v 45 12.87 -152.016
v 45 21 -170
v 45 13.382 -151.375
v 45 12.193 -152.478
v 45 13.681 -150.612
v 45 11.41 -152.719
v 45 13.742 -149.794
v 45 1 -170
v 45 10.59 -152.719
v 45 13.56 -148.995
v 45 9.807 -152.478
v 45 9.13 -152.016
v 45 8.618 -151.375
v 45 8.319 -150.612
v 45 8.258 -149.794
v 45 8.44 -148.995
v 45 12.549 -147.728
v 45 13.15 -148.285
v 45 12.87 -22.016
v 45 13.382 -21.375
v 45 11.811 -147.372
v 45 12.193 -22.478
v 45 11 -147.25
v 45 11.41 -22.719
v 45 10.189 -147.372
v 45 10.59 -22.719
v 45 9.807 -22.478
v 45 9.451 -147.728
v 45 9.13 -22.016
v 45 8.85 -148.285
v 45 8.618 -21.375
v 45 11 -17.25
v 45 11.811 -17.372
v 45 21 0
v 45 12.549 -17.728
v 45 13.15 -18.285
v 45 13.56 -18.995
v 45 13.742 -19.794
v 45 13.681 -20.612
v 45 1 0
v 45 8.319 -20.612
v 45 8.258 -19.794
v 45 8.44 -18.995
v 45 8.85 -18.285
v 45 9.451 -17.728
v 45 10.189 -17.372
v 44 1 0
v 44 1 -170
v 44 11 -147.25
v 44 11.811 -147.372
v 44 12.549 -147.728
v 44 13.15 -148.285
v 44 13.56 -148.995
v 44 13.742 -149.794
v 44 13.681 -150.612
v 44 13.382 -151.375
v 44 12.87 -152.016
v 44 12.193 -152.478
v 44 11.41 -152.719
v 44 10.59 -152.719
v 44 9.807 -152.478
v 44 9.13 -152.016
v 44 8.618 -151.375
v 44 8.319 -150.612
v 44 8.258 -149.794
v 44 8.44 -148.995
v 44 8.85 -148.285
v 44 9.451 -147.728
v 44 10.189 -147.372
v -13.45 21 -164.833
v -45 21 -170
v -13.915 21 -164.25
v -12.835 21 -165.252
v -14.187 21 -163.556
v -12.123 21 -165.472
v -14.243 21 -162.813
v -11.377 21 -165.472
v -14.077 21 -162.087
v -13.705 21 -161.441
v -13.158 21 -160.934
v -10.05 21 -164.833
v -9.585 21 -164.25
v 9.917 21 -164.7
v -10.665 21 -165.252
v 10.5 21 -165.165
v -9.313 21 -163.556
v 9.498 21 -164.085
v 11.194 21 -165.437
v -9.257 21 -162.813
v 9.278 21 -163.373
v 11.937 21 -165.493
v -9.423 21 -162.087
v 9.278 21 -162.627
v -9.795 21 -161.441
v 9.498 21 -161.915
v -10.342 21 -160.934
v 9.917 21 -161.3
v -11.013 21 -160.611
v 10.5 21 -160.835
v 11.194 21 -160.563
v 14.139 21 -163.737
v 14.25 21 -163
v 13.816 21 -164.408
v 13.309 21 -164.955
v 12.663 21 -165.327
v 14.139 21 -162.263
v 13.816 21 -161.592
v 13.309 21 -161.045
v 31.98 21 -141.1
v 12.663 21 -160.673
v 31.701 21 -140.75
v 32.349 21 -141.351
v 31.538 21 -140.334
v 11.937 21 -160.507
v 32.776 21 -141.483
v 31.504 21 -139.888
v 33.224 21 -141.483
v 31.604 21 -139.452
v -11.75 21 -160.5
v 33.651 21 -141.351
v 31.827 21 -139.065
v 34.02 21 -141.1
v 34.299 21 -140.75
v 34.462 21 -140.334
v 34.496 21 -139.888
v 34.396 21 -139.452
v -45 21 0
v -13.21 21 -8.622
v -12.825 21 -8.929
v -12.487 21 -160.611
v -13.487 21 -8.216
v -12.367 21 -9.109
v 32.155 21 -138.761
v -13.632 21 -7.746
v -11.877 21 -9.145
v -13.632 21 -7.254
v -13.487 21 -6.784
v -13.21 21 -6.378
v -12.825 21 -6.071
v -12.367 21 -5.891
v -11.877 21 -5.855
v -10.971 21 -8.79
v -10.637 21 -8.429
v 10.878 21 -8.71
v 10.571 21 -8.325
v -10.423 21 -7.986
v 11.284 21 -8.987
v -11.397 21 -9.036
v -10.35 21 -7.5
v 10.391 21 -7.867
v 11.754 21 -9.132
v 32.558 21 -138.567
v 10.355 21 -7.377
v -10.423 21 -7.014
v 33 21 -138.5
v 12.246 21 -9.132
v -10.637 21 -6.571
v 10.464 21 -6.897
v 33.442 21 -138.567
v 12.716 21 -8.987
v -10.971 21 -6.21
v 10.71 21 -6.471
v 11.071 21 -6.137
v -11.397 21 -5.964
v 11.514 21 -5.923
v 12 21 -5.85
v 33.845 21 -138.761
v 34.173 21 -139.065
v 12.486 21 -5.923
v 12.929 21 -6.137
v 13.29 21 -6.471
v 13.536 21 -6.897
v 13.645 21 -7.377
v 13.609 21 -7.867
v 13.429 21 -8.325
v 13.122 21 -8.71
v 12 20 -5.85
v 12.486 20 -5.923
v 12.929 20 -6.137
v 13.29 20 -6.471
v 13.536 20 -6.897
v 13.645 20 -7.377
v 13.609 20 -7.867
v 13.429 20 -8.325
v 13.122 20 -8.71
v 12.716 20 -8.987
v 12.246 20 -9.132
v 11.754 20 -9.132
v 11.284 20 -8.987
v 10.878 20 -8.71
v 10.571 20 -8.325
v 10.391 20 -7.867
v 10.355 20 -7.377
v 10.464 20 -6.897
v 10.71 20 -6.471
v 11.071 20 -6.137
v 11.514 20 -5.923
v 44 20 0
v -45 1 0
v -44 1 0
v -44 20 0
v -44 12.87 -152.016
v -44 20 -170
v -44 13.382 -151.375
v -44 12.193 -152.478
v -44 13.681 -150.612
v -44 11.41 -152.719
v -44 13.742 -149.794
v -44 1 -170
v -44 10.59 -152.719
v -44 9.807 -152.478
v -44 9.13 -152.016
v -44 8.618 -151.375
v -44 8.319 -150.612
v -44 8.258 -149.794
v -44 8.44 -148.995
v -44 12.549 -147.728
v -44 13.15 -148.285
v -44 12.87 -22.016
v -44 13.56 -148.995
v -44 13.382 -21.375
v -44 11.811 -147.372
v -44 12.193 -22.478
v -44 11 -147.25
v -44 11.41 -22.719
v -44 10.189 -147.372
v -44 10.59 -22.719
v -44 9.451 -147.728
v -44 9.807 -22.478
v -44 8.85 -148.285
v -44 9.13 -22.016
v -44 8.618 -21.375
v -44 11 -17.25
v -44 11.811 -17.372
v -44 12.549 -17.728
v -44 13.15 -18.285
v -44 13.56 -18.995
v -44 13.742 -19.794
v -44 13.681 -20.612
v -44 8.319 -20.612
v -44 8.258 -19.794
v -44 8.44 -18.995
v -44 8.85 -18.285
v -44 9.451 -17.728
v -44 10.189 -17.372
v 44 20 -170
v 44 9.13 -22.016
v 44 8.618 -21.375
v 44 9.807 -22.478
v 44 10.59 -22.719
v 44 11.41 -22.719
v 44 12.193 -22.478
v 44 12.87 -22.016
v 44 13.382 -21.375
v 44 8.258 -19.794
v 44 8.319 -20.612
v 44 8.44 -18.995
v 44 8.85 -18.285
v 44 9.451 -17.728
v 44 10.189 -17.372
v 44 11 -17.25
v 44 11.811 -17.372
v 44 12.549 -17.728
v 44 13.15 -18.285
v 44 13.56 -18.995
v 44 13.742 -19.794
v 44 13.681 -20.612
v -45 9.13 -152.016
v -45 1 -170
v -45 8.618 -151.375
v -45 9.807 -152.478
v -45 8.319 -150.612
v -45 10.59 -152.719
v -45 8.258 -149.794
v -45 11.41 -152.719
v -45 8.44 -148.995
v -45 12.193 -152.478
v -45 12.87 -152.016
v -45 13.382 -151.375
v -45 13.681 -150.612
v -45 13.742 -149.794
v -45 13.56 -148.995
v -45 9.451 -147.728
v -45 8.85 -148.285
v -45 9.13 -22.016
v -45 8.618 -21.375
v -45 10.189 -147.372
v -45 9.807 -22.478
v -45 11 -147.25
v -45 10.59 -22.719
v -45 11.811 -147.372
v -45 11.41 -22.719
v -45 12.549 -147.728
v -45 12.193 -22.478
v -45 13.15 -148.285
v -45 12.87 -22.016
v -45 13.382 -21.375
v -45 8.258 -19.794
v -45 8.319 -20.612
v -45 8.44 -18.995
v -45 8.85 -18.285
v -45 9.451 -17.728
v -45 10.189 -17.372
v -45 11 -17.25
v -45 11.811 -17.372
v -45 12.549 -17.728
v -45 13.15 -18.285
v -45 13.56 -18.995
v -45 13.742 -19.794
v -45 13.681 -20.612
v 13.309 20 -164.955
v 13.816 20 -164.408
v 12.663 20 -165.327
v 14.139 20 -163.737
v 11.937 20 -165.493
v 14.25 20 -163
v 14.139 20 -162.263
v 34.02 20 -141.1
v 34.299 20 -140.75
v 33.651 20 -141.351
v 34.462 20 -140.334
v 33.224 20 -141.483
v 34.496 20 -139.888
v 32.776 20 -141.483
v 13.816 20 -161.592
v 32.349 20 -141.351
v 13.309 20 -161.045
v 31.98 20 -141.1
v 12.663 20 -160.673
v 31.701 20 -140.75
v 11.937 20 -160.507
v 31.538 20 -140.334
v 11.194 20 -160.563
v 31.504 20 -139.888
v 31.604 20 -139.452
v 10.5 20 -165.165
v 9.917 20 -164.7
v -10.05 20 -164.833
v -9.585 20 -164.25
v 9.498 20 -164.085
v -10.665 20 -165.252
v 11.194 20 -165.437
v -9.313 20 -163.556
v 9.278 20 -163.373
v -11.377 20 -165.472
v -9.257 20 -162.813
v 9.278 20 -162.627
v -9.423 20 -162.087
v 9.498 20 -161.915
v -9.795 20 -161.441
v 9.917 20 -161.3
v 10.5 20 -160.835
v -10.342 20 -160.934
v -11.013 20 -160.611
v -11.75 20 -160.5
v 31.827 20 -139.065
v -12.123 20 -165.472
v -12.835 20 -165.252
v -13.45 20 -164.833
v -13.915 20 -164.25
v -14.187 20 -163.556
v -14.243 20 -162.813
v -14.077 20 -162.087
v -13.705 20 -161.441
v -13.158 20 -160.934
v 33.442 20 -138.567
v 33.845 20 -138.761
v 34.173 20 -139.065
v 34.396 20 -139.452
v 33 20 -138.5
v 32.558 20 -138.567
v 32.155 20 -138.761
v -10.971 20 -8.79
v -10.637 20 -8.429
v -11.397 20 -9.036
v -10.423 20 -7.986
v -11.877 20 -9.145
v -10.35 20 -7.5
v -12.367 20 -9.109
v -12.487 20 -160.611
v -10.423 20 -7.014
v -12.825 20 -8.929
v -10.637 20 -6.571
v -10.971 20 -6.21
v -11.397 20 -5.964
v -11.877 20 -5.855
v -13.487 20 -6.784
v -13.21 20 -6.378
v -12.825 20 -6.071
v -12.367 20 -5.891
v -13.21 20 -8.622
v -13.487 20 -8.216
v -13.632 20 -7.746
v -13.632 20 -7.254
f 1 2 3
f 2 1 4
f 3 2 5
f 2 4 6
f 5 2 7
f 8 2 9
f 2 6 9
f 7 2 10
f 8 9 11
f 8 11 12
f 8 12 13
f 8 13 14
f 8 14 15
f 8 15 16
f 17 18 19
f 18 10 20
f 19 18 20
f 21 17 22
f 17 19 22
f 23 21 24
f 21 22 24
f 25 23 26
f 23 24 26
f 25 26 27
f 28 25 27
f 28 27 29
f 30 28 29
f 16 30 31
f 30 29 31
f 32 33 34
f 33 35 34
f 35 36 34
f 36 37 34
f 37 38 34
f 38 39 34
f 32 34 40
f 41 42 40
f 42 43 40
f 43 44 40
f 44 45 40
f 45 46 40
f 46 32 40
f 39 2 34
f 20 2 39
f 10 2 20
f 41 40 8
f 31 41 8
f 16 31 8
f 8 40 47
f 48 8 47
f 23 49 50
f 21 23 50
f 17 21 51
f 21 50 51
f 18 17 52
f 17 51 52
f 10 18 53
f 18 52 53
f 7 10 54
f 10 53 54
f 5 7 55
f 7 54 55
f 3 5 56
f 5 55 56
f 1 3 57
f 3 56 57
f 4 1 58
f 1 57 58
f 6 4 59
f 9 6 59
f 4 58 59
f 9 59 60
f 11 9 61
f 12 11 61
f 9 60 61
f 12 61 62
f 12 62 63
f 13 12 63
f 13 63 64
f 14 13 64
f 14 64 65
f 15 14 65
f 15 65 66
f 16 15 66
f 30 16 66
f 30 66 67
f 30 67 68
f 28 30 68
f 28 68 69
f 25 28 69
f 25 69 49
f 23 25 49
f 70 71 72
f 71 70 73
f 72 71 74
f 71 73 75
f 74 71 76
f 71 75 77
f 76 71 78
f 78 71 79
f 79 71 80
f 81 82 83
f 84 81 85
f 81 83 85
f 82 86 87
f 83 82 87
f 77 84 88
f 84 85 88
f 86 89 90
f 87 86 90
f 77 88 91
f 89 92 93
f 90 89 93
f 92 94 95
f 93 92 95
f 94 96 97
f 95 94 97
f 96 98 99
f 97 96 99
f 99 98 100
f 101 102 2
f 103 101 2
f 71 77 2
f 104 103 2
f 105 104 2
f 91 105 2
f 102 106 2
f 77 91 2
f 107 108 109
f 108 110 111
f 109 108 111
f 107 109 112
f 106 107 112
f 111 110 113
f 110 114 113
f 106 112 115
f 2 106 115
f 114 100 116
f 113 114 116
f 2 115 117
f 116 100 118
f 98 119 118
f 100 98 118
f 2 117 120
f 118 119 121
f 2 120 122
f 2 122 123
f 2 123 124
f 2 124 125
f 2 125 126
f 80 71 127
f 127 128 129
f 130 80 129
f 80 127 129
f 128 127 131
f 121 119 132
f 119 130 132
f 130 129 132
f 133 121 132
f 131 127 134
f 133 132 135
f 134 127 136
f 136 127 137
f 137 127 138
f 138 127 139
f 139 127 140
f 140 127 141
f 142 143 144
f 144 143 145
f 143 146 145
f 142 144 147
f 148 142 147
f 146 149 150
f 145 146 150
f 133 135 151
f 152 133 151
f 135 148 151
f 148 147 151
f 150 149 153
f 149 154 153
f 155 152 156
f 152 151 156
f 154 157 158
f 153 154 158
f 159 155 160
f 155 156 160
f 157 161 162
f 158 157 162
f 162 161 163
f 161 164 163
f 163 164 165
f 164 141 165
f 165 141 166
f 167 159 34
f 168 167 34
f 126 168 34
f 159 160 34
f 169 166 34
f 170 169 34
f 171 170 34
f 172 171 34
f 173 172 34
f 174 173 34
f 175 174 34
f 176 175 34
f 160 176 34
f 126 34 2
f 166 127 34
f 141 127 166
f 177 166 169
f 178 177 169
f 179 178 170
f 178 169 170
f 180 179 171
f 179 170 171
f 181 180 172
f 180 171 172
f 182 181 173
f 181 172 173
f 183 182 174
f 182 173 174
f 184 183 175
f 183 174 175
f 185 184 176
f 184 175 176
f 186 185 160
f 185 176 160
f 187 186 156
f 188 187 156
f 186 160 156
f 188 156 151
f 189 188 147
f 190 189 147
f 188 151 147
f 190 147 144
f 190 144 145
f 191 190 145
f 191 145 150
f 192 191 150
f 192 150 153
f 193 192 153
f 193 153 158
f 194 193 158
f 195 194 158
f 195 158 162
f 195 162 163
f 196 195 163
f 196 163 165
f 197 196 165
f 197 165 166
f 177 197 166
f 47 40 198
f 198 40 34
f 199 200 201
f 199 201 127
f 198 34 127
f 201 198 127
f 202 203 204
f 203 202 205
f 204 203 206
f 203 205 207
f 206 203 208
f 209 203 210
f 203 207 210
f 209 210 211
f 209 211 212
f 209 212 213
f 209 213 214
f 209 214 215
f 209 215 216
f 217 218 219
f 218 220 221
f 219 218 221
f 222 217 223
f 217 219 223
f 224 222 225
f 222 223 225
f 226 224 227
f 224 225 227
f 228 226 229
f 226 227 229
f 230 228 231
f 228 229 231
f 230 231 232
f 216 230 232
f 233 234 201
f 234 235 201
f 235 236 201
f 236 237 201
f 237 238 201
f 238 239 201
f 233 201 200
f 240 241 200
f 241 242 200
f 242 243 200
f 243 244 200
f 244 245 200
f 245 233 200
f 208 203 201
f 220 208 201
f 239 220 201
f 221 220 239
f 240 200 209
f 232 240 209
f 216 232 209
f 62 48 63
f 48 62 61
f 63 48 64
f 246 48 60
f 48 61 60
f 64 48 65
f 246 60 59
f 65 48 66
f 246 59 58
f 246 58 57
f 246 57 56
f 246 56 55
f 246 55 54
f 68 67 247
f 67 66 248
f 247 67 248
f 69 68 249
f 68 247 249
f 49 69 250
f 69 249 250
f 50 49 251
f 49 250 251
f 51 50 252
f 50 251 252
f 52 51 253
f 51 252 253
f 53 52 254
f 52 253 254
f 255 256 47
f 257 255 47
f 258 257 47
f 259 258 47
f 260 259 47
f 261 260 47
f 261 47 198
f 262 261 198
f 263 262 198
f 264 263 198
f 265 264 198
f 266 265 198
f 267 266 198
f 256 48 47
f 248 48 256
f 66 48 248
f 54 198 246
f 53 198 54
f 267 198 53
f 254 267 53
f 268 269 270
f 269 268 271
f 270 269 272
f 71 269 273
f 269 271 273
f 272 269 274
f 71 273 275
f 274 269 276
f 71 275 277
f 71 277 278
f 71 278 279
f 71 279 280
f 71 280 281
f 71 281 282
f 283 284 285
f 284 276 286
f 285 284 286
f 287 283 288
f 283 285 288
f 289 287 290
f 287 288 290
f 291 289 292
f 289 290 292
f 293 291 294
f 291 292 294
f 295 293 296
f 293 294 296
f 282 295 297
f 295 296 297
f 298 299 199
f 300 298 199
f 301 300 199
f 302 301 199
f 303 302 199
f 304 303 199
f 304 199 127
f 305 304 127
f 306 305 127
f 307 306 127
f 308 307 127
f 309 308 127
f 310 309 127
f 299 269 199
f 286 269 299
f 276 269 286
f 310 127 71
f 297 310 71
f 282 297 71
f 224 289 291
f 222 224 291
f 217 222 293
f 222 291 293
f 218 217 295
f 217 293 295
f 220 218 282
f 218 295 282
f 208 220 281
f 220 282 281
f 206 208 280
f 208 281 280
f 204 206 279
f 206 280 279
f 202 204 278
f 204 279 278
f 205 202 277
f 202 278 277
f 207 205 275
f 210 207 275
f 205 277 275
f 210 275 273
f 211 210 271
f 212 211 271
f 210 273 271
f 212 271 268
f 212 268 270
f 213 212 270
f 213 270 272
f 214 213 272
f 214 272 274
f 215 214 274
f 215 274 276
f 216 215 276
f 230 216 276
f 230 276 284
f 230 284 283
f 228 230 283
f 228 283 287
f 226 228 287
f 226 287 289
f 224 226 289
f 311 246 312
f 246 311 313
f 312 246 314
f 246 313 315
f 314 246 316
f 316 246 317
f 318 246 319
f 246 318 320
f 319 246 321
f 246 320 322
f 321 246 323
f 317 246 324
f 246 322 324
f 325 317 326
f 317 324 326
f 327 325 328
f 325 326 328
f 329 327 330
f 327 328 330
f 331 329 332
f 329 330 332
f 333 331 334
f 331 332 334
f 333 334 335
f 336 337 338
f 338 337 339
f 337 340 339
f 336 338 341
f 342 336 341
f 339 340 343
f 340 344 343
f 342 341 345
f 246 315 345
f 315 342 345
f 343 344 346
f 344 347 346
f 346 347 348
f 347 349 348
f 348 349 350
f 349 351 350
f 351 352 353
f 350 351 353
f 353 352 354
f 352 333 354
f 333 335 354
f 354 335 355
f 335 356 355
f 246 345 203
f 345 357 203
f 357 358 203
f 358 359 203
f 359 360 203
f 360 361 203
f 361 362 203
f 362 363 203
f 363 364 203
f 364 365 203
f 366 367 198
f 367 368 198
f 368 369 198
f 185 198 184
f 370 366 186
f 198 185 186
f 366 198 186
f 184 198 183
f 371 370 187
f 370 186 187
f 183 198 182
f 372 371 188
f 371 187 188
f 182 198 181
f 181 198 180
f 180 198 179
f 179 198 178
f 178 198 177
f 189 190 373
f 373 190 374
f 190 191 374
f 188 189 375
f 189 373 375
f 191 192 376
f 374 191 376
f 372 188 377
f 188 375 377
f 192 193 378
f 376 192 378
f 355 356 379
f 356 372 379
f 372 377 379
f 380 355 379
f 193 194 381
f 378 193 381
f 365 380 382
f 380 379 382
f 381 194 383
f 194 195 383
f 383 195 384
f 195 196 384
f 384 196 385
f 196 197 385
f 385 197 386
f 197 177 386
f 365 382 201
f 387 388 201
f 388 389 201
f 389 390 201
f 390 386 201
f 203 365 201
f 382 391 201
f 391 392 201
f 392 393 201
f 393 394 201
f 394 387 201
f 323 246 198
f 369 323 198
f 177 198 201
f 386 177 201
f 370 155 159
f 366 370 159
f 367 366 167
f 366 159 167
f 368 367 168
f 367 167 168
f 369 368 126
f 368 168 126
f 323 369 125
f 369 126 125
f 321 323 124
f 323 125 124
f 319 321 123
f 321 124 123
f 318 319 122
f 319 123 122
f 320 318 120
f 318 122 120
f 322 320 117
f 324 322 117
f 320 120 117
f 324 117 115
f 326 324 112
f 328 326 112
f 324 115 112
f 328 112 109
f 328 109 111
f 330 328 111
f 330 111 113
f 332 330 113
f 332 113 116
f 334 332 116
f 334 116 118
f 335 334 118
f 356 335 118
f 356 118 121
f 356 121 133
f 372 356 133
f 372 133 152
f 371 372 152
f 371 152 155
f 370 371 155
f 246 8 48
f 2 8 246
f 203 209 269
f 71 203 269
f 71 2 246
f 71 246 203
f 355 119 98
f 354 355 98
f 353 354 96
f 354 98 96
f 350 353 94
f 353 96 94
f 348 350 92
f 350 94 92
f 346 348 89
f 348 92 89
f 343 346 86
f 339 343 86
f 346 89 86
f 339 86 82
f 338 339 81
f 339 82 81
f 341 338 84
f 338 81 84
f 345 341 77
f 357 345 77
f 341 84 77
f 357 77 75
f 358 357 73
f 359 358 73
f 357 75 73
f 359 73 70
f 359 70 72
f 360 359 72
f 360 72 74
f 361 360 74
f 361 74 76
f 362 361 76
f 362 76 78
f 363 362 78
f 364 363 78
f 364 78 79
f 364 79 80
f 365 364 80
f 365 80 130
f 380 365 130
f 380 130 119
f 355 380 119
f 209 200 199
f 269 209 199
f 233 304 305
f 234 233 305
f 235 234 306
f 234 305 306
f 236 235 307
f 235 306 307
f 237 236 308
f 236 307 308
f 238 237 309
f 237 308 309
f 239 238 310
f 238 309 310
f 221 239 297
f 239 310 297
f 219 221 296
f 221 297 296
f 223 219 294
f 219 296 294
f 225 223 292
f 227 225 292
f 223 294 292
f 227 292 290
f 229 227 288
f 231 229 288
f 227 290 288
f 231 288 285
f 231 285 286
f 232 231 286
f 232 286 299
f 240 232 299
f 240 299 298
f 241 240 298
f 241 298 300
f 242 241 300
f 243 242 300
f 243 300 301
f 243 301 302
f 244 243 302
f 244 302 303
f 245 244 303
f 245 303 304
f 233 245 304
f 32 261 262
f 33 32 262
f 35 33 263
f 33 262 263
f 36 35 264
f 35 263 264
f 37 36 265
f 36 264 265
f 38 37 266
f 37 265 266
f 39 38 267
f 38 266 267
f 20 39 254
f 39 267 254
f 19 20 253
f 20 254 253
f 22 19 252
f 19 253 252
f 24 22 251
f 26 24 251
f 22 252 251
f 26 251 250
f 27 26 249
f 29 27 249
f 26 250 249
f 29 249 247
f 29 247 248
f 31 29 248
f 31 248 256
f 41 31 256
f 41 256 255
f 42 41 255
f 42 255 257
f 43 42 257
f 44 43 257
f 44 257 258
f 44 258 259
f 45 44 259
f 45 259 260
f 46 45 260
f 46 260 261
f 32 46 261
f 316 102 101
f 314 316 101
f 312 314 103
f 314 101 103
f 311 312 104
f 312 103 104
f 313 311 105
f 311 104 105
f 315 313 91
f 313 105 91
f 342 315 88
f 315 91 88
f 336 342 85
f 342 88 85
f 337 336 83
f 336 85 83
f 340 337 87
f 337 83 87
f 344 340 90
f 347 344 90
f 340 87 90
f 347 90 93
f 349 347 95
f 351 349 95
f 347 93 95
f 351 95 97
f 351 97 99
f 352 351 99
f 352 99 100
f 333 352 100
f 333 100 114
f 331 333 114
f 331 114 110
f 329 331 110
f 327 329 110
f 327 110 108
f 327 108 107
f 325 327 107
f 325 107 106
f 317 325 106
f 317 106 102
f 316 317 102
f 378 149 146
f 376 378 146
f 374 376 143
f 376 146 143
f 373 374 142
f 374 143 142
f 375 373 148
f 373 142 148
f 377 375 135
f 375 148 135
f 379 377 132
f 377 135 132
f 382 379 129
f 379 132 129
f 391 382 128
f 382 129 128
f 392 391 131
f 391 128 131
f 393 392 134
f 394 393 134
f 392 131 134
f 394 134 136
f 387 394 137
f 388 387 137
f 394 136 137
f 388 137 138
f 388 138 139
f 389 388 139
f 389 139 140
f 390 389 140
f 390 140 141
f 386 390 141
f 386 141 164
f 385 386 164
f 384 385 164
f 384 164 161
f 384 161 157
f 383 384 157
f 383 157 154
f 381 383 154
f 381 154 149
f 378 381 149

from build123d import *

# Parameters (mm, degrees)
BOSS_EXTRUDE1_DEPTH = 170
SKETCH2_R           = 2.75
CUT_EXTRUDE1_DEPTH  = 90
SKETCH3_R           = 1.65
CUT_EXTRUDE2_DEPTH  = 10
CUT_EXTRUDE3_REACH  = 178.989
SKETCH4_R           = 2.5
CUT_EXTRUDE4_REACH  = 178.989
SKETCH5_R           = 1.5


with BuildPart() as part:
    # Sketch1 → Boss-Extrude1 (new body)
    with BuildSketch(Plane.XY):
        Polygon((-45, 1), (-45, 21), (45, 21), (45, 1), (44, 1), (44, 20), (-44, 20), (-44, 1), align=None)
    extrude(amount=-BOSS_EXTRUDE1_DEPTH)

    # Sketch2 → Cut-Extrude1 (cut)
    with BuildSketch(Plane.ZY.offset(45)):
        with Locations((-150, 11)):
            Circle(SKETCH2_R)
        with Locations((-20, 11)):
            Circle(SKETCH2_R)
    extrude(amount=-CUT_EXTRUDE1_DEPTH, mode=Mode.SUBTRACT)

    # Sketch3 → Cut-Extrude2 (cut)
    with BuildSketch(Plane(origin=(0, 21, 0), x_dir=(1, 0, 0), z_dir=(0, 1, 0))):
        with Locations(Location((12, 7.5, 0), (0, 0, 270))):
            Circle(SKETCH3_R)
        with Locations((-12, 7.5)):
            Circle(SKETCH3_R)
    extrude(amount=-CUT_EXTRUDE2_DEPTH, mode=Mode.SUBTRACT)

    # Sketch4 → Cut-Extrude3 (cut, up to next)
    with BuildSketch(Plane(origin=(0, 21, 0), x_dir=(1, 0, 0), z_dir=(0, 1, 0)), mode=Mode.PRIVATE) as cut_extrude3_sk1:
        with Locations(Location((-11.75, 163, 0), (0, 0, 270))):
            Circle(SKETCH4_R)
    cut_extrude3_tool1 = extrude(cut_extrude3_sk1.sketch, amount=-CUT_EXTRUDE3_REACH, mode=Mode.PRIVATE) & part.part
    # Sketch4 → Cut-Extrude3 (cut, up to next)
    with BuildSketch(Plane(origin=(0, 21, 0), x_dir=(1, 0, 0), z_dir=(0, 1, 0)), mode=Mode.PRIVATE) as cut_extrude3_sk2:
        with Locations((11.75, 163)):
            Circle(SKETCH4_R)
    cut_extrude3_tool2 = extrude(cut_extrude3_sk2.sketch, amount=-CUT_EXTRUDE3_REACH, mode=Mode.PRIVATE) & part.part
    add(cut_extrude3_tool1.solids().sort_by_distance((-11.75, 21, -163))[0], mode=Mode.SUBTRACT)
    add(cut_extrude3_tool2.solids().sort_by_distance((11.75, 21, -163))[0], mode=Mode.SUBTRACT)

    # Sketch5 → Cut-Extrude4 (cut, up to next)
    with BuildSketch(Plane(origin=(0, 21, 0), x_dir=(1, 0, 0), z_dir=(0, 1, 0)), mode=Mode.PRIVATE) as cut_extrude4_sk1:
        with Locations(Location((33, 140, 0), (0, 0, 270))):
            Circle(SKETCH5_R)
    cut_extrude4_tool1 = extrude(cut_extrude4_sk1.sketch, amount=-CUT_EXTRUDE4_REACH, mode=Mode.PRIVATE) & part.part
    add(cut_extrude4_tool1.solids().sort_by_distance((33, 21, -140))[0], mode=Mode.SUBTRACT)


solid = part.part
